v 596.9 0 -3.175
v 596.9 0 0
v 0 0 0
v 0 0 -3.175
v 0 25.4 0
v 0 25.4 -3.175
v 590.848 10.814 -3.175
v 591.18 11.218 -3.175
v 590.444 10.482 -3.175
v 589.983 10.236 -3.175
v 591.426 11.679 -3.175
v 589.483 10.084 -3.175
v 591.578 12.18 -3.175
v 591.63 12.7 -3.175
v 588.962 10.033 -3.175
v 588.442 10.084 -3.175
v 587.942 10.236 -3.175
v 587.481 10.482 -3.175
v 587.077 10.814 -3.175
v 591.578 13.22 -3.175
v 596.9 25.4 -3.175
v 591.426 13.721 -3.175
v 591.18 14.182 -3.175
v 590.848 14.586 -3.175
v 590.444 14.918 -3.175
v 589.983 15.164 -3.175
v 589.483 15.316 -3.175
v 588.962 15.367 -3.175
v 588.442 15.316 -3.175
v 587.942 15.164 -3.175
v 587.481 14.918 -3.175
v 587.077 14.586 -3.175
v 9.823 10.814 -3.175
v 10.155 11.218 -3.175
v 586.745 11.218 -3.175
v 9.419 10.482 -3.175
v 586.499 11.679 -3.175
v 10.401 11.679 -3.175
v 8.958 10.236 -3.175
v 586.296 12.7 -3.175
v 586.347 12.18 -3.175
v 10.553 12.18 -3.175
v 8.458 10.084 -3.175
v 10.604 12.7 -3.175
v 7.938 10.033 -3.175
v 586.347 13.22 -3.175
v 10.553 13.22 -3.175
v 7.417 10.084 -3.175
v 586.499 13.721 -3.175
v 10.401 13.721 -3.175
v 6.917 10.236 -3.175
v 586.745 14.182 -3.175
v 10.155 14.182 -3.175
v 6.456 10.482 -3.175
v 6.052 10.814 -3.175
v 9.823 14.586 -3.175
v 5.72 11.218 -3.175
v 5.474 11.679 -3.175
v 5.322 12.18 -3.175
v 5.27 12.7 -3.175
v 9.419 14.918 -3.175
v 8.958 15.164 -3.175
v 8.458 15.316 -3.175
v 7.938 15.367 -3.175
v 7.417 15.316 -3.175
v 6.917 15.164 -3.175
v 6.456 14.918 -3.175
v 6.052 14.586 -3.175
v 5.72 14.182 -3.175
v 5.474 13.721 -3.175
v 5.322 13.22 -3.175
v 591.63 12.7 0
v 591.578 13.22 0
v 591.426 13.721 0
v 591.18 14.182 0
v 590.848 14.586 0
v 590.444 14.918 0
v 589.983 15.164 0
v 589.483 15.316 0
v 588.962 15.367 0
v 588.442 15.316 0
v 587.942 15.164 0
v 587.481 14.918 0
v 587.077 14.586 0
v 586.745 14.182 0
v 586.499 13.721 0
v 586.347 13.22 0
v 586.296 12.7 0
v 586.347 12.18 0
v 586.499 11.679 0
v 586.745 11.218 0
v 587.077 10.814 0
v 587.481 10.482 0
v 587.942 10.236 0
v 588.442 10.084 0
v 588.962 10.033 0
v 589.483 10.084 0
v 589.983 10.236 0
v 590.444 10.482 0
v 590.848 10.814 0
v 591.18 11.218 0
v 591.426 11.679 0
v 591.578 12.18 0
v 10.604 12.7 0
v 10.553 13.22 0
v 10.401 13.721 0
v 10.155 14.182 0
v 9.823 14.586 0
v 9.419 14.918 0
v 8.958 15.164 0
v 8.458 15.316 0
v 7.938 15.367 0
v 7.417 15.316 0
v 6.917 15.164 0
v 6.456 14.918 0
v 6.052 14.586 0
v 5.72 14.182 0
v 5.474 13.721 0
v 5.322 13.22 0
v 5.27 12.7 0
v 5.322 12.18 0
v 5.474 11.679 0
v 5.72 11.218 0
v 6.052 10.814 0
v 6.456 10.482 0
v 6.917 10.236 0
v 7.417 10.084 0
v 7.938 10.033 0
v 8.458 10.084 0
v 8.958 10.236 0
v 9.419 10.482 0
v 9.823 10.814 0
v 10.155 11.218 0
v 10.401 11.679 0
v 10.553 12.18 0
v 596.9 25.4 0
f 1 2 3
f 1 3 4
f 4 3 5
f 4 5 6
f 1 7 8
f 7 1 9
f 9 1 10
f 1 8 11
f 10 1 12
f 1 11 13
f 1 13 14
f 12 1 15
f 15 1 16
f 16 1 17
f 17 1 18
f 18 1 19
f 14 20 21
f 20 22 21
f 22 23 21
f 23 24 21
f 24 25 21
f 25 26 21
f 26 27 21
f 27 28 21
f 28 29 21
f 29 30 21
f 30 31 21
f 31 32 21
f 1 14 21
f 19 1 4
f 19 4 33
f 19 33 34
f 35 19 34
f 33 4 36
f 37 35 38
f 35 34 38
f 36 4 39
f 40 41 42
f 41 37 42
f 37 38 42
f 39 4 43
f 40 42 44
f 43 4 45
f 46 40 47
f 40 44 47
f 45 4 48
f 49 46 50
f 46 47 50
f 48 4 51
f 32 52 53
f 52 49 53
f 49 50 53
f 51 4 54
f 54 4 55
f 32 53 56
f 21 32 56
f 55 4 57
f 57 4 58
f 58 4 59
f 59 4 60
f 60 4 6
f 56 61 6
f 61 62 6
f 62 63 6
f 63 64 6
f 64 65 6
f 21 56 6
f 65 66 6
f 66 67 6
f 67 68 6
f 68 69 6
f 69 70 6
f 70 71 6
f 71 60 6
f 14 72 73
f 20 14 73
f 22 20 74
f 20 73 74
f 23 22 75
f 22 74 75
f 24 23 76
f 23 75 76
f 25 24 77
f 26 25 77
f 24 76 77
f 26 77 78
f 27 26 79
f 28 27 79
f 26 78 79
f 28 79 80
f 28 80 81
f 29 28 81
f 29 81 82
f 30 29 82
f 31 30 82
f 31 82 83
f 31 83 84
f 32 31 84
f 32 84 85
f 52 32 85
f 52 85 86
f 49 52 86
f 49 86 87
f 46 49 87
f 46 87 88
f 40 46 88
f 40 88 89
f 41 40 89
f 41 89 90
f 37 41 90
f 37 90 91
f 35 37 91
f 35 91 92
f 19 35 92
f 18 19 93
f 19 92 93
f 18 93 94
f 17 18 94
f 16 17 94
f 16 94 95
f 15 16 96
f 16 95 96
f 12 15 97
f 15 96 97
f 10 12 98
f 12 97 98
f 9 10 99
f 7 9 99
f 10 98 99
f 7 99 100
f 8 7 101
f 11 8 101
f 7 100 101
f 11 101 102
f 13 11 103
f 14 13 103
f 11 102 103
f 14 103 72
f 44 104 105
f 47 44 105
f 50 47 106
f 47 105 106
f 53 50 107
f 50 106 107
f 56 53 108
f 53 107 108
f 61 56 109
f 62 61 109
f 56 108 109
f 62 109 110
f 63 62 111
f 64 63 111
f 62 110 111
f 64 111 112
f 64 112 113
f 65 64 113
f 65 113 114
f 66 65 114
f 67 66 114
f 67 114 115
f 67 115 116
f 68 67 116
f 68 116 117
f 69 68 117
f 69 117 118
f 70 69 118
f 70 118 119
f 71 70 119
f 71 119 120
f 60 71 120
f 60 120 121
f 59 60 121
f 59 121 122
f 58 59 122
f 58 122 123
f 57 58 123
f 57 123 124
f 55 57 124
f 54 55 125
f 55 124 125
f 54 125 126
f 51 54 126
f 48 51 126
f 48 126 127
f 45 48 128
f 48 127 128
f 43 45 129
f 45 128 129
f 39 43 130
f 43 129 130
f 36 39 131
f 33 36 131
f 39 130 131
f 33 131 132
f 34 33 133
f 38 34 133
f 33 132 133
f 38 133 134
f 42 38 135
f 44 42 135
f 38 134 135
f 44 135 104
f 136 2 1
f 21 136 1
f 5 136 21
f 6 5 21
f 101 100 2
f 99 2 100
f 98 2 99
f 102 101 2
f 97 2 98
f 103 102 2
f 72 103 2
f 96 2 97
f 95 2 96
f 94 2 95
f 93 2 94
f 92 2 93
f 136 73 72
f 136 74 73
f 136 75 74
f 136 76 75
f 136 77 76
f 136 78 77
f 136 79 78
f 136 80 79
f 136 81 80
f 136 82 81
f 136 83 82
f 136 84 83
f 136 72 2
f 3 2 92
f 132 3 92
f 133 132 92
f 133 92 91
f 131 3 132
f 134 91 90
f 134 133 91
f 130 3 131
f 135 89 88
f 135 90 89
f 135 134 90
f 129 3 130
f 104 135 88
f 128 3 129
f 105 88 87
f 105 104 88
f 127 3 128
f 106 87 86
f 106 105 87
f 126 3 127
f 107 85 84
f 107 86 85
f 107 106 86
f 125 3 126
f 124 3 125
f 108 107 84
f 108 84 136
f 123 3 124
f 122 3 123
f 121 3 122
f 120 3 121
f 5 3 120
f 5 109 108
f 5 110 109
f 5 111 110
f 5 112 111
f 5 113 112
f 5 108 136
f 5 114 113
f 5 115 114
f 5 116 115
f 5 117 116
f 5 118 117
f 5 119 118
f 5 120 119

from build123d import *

# Parameters (mm, degrees)
SKETCH1_W           = 3.175
SKETCH1_H           = 25.4
BOSS_EXTRUDE1_DEPTH = 596.9
CUT_EXTRUDE1_REACH  = 5.175
SKETCH2_R           = 2.667


with BuildPart() as part:
    # Sketch1 → Boss-Extrude1 (new body)
    with BuildSketch(Plane(origin=(0, 0, 0), x_dir=(0, 0, -1), z_dir=(1, 0, 0))):
        with Locations((1.5875, 12.7)):
            Rectangle(SKETCH1_W, SKETCH1_H)
    extrude(amount=BOSS_EXTRUDE1_DEPTH)

    # Sketch2 → Cut-Extrude1 (cut, up to next)
    with BuildSketch(Plane.XY, mode=Mode.PRIVATE) as cut_extrude1_sk1:
        with Locations((7.9375, 12.7)):
            Circle(SKETCH2_R)
    cut_extrude1_tool1 = extrude(cut_extrude1_sk1.sketch, amount=-CUT_EXTRUDE1_REACH, mode=Mode.PRIVATE) & part.part
    add(cut_extrude1_tool1.solids().sort_by_distance((7.9375, 12.7, 0))[0], mode=Mode.SUBTRACT)
    # Sketch2 → Cut-Extrude1 (cut, up to next)
    with BuildSketch(Plane.XY, mode=Mode.PRIVATE) as cut_extrude1_sk2:
        with Locations((588.9625, 12.7)):
            Circle(SKETCH2_R)
    cut_extrude1_tool2 = extrude(cut_extrude1_sk2.sketch, amount=-CUT_EXTRUDE1_REACH, mode=Mode.PRIVATE) & part.part
    add(cut_extrude1_tool2.solids().sort_by_distance((588.9625, 12.7, 0))[0], mode=Mode.SUBTRACT)


solid = part.part
